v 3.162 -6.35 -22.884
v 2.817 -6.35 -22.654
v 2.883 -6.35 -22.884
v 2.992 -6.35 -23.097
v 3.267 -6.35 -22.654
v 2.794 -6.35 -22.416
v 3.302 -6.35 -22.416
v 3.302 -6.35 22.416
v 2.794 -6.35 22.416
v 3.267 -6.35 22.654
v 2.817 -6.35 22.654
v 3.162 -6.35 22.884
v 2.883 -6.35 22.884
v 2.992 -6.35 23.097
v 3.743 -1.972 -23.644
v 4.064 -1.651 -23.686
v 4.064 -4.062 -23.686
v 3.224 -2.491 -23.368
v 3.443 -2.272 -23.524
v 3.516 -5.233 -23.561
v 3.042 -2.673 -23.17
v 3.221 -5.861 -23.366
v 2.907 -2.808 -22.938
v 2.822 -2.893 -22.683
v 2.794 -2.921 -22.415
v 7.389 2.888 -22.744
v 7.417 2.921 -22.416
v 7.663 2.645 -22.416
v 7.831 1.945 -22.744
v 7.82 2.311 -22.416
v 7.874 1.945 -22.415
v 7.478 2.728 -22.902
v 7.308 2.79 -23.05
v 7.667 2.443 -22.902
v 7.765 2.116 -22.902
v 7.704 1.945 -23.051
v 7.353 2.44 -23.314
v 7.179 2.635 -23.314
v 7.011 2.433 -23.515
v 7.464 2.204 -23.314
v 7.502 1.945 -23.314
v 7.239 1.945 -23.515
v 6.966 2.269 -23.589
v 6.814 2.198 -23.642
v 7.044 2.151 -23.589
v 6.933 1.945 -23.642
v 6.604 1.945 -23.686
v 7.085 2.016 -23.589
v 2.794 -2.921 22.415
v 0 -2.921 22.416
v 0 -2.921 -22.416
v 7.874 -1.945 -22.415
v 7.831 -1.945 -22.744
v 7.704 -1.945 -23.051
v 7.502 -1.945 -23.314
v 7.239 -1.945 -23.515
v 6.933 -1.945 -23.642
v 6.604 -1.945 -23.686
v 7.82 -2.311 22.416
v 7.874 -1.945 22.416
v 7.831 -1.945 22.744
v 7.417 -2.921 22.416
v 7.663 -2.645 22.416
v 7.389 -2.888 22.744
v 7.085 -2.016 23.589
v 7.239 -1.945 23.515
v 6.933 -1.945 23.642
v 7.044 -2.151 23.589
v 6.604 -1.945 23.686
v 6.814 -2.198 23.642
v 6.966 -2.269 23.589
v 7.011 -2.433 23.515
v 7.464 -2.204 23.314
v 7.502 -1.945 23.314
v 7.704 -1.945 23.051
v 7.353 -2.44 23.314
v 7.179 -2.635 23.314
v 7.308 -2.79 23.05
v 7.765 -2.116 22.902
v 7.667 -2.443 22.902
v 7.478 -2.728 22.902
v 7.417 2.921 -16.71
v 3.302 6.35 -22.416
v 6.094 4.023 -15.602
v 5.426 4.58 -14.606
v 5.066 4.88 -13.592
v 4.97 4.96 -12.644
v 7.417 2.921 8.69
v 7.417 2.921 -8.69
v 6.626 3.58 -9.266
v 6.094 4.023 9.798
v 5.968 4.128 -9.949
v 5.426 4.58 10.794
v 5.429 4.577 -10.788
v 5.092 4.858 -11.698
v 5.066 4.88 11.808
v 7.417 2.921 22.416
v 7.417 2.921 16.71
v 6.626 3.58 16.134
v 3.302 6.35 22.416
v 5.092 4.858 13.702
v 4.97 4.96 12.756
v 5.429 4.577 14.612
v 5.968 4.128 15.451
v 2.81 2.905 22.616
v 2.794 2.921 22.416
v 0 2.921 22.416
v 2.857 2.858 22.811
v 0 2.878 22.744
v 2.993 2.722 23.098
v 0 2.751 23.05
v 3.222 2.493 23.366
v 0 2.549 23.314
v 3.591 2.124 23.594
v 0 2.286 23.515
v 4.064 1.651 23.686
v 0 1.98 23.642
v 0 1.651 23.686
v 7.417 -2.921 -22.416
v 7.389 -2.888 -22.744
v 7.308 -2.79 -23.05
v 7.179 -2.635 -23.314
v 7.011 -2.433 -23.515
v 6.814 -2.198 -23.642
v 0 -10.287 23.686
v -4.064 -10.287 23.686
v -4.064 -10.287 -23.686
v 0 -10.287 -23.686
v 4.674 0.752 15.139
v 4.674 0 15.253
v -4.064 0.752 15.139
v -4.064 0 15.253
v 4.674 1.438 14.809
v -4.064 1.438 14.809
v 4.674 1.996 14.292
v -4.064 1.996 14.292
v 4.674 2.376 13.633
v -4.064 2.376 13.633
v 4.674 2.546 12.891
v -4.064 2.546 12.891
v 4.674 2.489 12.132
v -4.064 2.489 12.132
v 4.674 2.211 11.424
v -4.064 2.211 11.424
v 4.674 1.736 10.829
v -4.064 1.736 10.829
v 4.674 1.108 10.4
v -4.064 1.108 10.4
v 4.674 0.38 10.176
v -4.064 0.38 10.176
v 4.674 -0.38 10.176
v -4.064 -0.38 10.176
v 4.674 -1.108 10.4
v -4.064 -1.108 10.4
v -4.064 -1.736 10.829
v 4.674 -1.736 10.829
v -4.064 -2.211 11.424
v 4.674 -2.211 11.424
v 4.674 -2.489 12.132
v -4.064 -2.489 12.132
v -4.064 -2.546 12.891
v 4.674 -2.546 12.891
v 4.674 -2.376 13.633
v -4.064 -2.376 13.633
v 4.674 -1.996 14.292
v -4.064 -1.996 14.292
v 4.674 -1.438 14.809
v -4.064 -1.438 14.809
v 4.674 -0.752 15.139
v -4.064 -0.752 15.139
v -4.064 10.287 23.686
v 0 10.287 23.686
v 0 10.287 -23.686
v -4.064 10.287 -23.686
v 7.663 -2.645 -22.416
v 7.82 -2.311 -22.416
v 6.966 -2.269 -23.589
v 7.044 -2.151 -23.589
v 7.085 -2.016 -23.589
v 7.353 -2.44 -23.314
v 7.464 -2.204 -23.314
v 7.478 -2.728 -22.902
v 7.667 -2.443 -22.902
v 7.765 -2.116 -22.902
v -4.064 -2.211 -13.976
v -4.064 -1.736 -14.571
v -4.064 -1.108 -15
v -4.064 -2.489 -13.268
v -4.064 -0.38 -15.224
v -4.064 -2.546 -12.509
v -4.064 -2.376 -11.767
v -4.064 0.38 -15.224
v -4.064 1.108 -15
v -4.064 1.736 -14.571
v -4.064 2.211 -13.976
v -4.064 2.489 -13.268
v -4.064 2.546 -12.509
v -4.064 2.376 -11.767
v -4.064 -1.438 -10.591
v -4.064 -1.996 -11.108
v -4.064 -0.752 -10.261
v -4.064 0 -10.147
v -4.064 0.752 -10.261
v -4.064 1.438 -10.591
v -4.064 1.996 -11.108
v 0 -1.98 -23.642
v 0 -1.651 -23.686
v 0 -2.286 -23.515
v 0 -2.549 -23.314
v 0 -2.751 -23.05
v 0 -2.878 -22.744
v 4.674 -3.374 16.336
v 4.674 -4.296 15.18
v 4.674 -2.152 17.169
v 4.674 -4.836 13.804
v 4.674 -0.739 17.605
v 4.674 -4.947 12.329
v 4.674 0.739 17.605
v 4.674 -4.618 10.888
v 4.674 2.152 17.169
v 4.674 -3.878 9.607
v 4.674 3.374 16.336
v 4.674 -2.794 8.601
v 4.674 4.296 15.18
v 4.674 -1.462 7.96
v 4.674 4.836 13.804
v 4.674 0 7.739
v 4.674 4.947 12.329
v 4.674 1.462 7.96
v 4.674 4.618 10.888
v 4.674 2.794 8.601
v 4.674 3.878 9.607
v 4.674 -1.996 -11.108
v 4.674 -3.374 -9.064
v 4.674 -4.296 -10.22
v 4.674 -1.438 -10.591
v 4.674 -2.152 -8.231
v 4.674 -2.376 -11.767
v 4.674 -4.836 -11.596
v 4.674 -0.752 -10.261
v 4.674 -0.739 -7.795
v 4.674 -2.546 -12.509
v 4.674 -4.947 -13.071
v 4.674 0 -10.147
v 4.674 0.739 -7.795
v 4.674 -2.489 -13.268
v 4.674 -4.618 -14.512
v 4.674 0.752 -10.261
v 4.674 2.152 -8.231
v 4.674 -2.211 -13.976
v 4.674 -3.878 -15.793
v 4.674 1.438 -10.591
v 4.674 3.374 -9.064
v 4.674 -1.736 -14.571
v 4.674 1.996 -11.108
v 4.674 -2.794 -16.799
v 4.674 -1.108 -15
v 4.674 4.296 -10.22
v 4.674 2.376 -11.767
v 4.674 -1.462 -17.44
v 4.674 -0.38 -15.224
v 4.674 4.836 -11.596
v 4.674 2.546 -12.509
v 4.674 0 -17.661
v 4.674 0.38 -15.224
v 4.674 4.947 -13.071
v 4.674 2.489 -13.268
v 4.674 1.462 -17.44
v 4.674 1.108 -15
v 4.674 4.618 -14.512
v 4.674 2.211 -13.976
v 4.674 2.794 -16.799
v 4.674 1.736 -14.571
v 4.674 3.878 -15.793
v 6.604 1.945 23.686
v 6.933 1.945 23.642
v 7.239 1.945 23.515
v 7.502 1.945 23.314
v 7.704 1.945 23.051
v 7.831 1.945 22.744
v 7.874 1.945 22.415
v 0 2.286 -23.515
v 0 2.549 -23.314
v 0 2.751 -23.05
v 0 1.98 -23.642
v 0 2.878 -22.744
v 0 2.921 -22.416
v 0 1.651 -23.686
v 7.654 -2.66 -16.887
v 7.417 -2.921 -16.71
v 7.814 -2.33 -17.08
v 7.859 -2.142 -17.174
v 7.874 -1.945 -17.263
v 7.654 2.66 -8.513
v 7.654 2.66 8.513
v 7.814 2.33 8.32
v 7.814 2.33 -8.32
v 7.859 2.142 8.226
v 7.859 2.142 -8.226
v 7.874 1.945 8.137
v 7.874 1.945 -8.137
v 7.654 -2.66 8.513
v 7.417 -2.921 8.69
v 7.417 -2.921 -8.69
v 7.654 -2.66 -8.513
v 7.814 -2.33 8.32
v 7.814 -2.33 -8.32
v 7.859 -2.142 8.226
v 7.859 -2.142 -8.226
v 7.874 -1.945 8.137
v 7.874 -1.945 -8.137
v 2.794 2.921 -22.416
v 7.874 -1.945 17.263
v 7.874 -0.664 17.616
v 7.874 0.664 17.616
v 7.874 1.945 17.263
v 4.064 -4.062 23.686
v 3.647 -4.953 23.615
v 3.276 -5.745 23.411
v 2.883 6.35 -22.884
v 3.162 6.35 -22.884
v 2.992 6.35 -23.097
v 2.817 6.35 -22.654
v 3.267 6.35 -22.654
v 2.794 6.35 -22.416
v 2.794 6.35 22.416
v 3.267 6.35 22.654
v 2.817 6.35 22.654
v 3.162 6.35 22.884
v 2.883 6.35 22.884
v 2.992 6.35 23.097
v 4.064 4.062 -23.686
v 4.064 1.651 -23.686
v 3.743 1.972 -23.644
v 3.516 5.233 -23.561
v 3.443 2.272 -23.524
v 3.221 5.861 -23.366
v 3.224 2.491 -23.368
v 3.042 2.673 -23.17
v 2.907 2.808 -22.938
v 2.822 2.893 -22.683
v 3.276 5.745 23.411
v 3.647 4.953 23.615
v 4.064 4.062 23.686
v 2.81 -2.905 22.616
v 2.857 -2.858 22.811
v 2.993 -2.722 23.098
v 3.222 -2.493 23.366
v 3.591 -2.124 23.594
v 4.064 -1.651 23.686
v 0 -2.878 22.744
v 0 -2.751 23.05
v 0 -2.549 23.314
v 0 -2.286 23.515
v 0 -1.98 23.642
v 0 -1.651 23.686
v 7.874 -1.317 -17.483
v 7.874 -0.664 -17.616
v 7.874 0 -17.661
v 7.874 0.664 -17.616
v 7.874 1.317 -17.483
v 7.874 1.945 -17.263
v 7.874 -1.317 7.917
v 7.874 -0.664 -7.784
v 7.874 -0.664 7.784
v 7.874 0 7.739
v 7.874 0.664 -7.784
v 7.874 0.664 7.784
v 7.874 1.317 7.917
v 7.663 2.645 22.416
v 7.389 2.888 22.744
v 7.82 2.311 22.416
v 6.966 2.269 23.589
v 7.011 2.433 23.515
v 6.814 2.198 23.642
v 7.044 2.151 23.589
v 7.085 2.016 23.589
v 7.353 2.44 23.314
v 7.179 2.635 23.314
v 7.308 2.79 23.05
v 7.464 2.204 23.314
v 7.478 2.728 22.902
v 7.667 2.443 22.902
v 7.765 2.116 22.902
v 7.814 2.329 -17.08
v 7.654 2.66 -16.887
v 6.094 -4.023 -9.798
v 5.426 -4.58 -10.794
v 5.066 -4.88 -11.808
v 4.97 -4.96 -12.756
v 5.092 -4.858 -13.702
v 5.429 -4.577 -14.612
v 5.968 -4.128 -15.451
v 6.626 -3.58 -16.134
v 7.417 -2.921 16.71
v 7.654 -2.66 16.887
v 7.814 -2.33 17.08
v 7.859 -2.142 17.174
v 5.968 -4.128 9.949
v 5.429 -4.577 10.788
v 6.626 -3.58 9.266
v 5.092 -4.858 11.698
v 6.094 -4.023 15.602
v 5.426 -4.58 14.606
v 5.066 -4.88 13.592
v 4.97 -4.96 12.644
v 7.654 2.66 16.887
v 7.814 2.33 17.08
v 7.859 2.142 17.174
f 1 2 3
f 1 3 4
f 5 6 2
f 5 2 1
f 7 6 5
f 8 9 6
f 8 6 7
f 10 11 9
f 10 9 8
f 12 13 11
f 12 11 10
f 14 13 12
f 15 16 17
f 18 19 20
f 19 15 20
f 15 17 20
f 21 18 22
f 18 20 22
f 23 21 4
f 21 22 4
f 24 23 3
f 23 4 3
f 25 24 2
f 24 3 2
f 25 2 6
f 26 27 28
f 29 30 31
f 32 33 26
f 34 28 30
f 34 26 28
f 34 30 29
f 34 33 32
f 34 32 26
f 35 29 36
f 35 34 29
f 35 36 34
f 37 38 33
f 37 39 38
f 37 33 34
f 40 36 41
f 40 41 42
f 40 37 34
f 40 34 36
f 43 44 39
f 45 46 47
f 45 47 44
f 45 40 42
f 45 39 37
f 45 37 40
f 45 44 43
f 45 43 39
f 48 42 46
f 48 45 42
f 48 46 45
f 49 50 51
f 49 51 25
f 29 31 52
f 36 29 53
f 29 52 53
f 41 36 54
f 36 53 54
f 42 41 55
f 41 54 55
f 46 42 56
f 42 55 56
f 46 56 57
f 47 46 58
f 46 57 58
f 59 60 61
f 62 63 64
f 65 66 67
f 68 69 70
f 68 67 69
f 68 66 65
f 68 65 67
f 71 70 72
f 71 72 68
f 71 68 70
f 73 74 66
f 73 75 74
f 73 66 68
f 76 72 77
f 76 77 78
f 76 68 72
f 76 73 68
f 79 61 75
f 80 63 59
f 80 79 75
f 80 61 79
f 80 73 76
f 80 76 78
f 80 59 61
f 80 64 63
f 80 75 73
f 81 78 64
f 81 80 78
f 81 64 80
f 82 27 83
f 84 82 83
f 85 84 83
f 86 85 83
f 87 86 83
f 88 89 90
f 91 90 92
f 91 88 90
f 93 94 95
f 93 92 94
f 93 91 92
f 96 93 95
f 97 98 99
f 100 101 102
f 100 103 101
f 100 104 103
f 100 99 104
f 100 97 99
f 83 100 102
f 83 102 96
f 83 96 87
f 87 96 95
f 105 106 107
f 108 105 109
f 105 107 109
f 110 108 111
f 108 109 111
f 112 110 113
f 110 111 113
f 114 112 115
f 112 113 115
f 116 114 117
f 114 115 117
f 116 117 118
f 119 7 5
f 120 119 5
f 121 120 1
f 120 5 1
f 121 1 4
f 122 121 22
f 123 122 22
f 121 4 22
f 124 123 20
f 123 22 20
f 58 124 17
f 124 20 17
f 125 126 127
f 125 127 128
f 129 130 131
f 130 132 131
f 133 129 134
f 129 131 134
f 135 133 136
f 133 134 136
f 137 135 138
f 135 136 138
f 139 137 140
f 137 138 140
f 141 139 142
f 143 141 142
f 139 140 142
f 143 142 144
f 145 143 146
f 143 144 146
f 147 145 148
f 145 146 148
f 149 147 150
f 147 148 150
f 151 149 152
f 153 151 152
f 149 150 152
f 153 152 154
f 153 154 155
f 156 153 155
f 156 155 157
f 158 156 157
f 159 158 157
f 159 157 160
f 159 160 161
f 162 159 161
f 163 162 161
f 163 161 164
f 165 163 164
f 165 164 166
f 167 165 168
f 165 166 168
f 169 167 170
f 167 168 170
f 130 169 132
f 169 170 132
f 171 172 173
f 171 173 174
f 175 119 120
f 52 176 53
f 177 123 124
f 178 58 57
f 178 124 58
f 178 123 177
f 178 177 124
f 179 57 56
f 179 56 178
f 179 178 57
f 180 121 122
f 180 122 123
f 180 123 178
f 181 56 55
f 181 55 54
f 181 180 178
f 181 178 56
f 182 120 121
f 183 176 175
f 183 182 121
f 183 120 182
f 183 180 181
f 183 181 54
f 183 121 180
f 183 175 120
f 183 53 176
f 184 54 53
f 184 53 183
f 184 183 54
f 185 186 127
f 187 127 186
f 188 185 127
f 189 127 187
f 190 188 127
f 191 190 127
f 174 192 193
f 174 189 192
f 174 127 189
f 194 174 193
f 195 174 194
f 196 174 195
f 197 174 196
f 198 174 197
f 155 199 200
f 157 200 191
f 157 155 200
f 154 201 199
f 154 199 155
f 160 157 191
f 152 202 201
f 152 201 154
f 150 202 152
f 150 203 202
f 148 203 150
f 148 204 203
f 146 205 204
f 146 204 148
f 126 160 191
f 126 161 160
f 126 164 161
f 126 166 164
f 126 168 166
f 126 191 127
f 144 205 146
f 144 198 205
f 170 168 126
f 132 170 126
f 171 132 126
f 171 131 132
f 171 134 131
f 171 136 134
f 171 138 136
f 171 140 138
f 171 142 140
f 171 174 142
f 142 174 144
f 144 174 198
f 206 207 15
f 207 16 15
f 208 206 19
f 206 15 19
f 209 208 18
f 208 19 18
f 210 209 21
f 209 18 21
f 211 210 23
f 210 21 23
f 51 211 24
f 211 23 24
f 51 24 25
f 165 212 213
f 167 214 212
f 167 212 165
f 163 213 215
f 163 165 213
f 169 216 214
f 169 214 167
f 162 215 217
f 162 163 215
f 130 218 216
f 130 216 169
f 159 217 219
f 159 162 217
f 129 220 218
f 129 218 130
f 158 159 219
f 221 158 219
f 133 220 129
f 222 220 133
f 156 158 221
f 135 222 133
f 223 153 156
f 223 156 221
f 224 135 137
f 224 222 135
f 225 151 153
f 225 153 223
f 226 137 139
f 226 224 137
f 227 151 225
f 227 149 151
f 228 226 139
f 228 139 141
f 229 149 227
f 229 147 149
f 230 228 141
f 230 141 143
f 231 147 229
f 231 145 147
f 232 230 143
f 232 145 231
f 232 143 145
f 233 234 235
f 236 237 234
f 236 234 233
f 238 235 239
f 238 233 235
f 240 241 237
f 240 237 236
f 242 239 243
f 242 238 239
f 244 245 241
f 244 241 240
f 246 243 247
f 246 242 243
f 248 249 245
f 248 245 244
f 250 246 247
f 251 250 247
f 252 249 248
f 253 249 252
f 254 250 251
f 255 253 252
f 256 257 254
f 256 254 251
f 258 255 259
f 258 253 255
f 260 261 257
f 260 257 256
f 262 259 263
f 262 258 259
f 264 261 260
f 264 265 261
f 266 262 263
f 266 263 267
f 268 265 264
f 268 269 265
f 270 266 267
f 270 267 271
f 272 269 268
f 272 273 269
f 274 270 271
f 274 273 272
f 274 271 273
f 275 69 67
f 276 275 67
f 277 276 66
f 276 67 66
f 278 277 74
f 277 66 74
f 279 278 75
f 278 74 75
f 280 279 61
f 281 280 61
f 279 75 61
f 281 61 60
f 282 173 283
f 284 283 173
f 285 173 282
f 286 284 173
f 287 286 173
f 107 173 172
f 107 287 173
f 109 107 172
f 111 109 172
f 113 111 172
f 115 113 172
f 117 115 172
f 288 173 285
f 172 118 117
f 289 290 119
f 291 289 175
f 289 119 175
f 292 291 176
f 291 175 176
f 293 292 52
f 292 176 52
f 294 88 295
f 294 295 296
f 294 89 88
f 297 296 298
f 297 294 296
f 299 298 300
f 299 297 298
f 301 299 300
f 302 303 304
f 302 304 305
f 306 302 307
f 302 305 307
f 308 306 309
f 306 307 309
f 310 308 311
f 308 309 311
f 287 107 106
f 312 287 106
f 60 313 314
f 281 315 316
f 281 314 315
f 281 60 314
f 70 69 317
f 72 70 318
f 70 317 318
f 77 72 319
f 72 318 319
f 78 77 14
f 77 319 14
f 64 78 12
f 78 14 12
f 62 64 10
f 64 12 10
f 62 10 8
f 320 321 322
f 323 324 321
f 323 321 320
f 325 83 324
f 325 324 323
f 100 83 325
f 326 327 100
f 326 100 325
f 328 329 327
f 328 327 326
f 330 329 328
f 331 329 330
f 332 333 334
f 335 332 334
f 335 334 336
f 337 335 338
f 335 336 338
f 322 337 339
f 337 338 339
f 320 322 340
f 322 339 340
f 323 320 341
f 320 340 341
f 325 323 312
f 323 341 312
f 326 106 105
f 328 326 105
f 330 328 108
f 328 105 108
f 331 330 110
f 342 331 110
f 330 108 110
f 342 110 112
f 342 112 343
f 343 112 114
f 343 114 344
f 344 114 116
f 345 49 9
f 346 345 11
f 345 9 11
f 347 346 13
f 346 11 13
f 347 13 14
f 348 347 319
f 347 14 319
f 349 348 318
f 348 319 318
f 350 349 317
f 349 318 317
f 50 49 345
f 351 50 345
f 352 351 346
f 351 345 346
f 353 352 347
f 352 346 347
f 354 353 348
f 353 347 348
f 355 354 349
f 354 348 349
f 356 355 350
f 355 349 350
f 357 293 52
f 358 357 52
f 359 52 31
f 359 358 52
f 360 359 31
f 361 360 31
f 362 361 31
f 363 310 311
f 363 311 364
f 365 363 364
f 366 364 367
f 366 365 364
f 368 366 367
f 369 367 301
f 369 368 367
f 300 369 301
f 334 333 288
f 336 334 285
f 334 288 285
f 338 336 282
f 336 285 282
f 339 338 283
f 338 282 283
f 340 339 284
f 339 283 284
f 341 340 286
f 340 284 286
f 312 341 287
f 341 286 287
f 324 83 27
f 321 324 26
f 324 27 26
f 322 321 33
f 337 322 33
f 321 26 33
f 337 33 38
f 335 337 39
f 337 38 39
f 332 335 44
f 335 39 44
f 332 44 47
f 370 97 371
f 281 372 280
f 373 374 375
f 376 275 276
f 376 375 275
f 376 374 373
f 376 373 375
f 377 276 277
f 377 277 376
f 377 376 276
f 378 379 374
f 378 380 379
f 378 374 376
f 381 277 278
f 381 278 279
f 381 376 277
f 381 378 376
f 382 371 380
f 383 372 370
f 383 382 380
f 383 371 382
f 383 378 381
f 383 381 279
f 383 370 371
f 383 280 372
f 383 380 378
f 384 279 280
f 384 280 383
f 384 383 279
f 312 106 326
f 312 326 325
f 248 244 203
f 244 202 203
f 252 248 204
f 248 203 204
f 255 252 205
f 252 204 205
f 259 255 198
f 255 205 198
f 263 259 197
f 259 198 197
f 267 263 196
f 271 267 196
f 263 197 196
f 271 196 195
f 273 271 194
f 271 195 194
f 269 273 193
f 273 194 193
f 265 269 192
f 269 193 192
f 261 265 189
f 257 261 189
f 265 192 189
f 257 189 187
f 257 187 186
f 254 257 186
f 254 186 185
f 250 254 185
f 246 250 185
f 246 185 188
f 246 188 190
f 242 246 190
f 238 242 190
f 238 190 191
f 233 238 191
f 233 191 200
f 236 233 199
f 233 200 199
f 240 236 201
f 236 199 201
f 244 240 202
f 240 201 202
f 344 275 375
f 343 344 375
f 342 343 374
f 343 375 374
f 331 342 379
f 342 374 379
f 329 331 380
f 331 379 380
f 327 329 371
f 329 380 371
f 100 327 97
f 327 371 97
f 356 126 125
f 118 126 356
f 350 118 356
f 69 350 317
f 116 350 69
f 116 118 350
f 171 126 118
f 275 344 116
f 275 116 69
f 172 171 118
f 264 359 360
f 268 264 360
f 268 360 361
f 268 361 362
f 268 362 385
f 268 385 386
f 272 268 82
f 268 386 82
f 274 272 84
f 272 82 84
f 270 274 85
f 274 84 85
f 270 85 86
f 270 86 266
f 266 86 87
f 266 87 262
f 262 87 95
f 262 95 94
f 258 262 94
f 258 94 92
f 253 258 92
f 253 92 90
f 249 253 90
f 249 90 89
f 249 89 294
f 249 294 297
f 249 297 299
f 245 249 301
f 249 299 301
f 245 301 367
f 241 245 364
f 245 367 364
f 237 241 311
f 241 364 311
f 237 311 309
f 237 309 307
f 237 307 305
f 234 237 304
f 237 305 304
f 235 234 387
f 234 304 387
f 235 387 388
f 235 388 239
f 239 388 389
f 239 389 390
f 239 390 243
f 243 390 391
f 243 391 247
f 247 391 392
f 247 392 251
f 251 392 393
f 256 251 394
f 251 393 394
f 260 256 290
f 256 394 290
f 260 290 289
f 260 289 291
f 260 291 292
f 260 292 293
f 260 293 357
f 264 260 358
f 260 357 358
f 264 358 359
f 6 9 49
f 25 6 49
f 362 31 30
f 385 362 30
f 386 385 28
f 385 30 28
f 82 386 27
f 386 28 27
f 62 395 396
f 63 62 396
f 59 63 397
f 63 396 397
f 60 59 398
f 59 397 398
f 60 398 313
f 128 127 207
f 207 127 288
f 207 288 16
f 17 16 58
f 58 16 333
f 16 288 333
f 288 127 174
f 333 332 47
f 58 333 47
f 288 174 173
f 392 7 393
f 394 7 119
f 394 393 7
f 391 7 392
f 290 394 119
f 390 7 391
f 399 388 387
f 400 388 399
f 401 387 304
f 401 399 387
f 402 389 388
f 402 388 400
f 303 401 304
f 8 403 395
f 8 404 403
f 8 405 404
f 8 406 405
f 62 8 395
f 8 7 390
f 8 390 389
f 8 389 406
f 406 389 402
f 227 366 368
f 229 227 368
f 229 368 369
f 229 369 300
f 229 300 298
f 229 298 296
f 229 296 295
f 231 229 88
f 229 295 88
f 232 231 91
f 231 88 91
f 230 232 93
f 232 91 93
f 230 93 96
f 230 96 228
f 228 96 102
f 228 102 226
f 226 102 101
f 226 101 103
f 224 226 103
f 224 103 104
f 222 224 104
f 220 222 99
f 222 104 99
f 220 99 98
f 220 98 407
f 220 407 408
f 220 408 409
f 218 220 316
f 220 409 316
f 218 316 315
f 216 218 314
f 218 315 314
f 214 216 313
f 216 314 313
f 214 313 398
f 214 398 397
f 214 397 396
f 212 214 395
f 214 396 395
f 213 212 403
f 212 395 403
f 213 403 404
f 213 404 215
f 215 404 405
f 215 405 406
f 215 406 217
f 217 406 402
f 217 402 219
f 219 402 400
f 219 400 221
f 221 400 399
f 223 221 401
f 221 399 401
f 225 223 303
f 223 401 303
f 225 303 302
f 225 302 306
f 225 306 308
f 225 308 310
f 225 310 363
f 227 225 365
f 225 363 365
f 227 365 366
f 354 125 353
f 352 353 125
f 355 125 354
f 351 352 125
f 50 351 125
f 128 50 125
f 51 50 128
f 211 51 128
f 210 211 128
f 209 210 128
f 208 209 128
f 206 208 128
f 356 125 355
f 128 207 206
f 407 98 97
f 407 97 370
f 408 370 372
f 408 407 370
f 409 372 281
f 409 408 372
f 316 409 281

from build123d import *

# Parameters (mm, degrees)
BOSS_EXTRUDE1_DEPTH                             = 47.371
SKETCH2_W                                       = 6.858
SKETCH2_H                                       = 3.429
CUT_EXTRUDE1_DEPTH                              = 49.438972089
SKETCH3_W                                       = 4.064
SKETCH3_H                                       = 47.371
BOSS_EXTRUDE2_DEPTH                             = 7.366
SKETCH4_W                                       = 6.858
SKETCH4_H                                       = 3.429
CUT_EXTRUDE2_DEPTH                              = 50.110425431
SKETCH5_W                                       = 4.064
SKETCH5_H                                       = 47.371
BOSS_EXTRUDE3_DEPTH                             = 7.366
F_3_CLEARANCE_HOLE1_D                           = 2.7686
CBORE_FOR_10_BUTTON_HEAD_CAP_SCREW1_D           = 5.1054
CBORE_FOR_10_BUTTON_HEAD_CAP_SCREW1_CBORE_D     = 9.92124
CBORE_FOR_10_BUTTON_HEAD_CAP_SCREW1_CBORE_DEPTH = 3.2004
FILLET1_R                                       = 1.27
FILLET3_R                                       = 1.27
FILLET5_R                                       = 1.27


with BuildPart() as part:
    # Sketch1 → Boss-Extrude1 (new body)
    with BuildSketch(Plane.XY.offset(23.6855)):
        Polygon((3.302, 6.35), (-4.064, 6.35), (-4.064, -6.35), (3.302, -6.35), (7.874, -2.54), (7.874, 2.54), align=None)
    extrude(amount=-BOSS_EXTRUDE1_DEPTH)

    # Sketch2 → Cut-Extrude1 (cut, through all)
    with BuildSketch(Plane.XY.offset(23.6855)):
        with Locations((-0.635, 4.6355)):
            Rectangle(SKETCH2_W, SKETCH2_H)
    extrude(amount=-CUT_EXTRUDE1_DEPTH, mode=Mode.SUBTRACT)

    # Sketch3 → Boss-Extrude2 (add)
    with BuildSketch(Plane(origin=(0, 2.921, 0), x_dir=(-1, 0, 0), z_dir=(0, 1, 0))):
        with Locations((2.032, 0)):
            Rectangle(SKETCH3_W, SKETCH3_H)
    extrude(amount=BOSS_EXTRUDE2_DEPTH)

    # Sketch4 → Cut-Extrude2 (cut, through all)
    with BuildSketch(Plane.XY.offset(23.6855)):
        with Locations((-0.635, -4.6355)):
            Rectangle(SKETCH4_W, SKETCH4_H)
    extrude(amount=-CUT_EXTRUDE2_DEPTH, mode=Mode.SUBTRACT)

    # Sketch5 → Boss-Extrude3 (add)
    with BuildSketch(Plane.XZ.offset(2.921)):
        with Locations((-2.032, 0)):
            Rectangle(SKETCH5_W, SKETCH5_H)
    extrude(amount=BOSS_EXTRUDE3_DEPTH)

    # #3 Clearance Hole1 (through all)
    with Locations(Plane.ZY.offset(4.064)):
        with Locations((12.7, 0), (-12.7, 0)):
            Hole(F_3_CLEARANCE_HOLE1_D / 2)

    # CBORE for #10 Button Head Cap Screw1 (through all)
    with Locations(Plane(origin=(7.874, 0, 0), x_dir=(0, 0, -1), z_dir=(1, 0, 0))):
        with Locations((-12.7, 0), (12.7, 0)):
            CounterBoreHole(CBORE_FOR_10_BUTTON_HEAD_CAP_SCREW1_D / 2, CBORE_FOR_10_BUTTON_HEAD_CAP_SCREW1_CBORE_D / 2, CBORE_FOR_10_BUTTON_HEAD_CAP_SCREW1_CBORE_DEPTH)

    # Fillet1
    fillet1_edges = [part.edges().sort_by_distance(p)[0] for p in [
        (7.874, -2.54, 20.323251747),
        (7.874, -2.54, -20.323251747),
        (7.874, -2.54, 0),
        (7.874, 2.54, 20.323251747),
        (7.874, 2.54, 0),
        (7.874, 2.54, -20.323251747),
    ]]
    fillet(fillet1_edges, radius=FILLET1_R)

    # Fillet3
    # the kernel refuses this fillet: 1.27 mm, written as the material it takes off along each edge
    with BuildSketch(Plane(origin=(0.862897437, -8.382585469, -23.6855), x_dir=(0, 0, 1), z_dir=(0.7682212795973759, 0.6401843996644799, 0)), Plane(origin=(7.417034188, 2.920804844, -23.6855), x_dir=(0, 0, 1), z_dir=(-0.7682212795973759, 0.6401843996644799, 0))) as fillet3_piece_1:
        with BuildLine():
            CenterArc((FILLET3_R, -FILLET3_R), FILLET3_R, 90, 90)
            Line((0, -FILLET3_R), (0, 0))
            Line((0, 0), (FILLET3_R, 0))
        make_face()
    extrude(amount=8.531574072, mode=Mode.SUBTRACT)
    with BuildSketch(Plane(origin=(6.604, -1.945163819, -23.6855), x_dir=(0.6401843996644796, -0.7682212795973762, 0), z_dir=(-0.7682212795973762, -0.6401843996644796, 0))) as fillet3_piece_2:
        with BuildLine():
            CenterArc((1.27 - FILLET3_R, FILLET3_R), FILLET3_R, 270, 90)
            Line((1.27, FILLET3_R), (1.27, 0))
            Line((1.27, 0), (1.27 - FILLET3_R, 0))
        make_face()
    revolve(axis=Axis((6.604, -1.945163819, -23.6855), (0, 0, 1)), revolution_arc=50.194428908, mode=Mode.SUBTRACT)
    with BuildSketch(Plane(origin=(6.604, 1.945163819, -23.6855), x_dir=(0.6401843996644799, 0.7682212795973757, 0), z_dir=(-0.7682212795973757, 0.6401843996644799, 0))) as fillet3_piece_3:
        with BuildLine():
            CenterArc((1.27 - FILLET3_R, -FILLET3_R), FILLET3_R, 0, 90)
            Line((1.27, -FILLET3_R), (1.27, 0))
            Line((1.27, 0), (1.27 - FILLET3_R, 0))
        make_face()
    revolve(axis=Axis((6.604, 1.945163819, -23.6855), (0, 0, -1)), revolution_arc=50.194428908, mode=Mode.SUBTRACT)
    with BuildSketch(Plane(origin=(2.794, -2.921, -23.6855), x_dir=(0, 0, 1), z_dir=(-1, 0, 0)), Plane(origin=(0, 2.921, -23.6855), x_dir=(0, 0, 1), z_dir=(1, 0, 0))) as fillet3_piece_4:
        with BuildLine():
            CenterArc((FILLET3_R, FILLET3_R), FILLET3_R, 180, 90)
            Line((0, FILLET3_R), (0, 0))
            Line((0, 0), (FILLET3_R, 0))
        make_face()
    extrude(amount=2.794, mode=Mode.SUBTRACT)
    with BuildSketch(Plane(origin=(2.794, 2.921, -23.6855), x_dir=(0, 0, 1), z_dir=(0, 1, 0)), Plane(origin=(2.794, -9.525, -23.6855), x_dir=(0, 0, 1), z_dir=(0, 1, 0))) as fillet3_piece_5:
        with BuildLine():
            CenterArc((FILLET3_R, FILLET3_R), FILLET3_R, 180, 90)
            Line((0, FILLET3_R), (0, 0))
            Line((0, 0), (FILLET3_R, 0))
        make_face()
    extrude(amount=6.604, mode=Mode.SUBTRACT)
    with BuildSketch(Plane(origin=(7.874, -1.945163819, -23.6855), x_dir=(-1, 0, 0), z_dir=(0, 1, 0))) as fillet3_piece_6:
        with BuildLine():
            CenterArc((FILLET3_R, FILLET3_R), FILLET3_R, 180, 90)
            Line((0, FILLET3_R), (0, 0))
            Line((0, 0), (FILLET3_R, 0))
        make_face()
    extrude(amount=3.890327637, mode=Mode.SUBTRACT)
    with BuildSketch(Plane(origin=(2.794, -9.525, -23.6855), x_dir=(0, 0, 1), z_dir=(0, 1, 0))) as fillet3_piece_7a_section:
        with BuildLine():
            CenterArc((FILLET3_R, FILLET3_R), FILLET3_R, 180, 90)
            Line((0, FILLET3_R), (0, 0))
            Line((0, 0), (FILLET3_R, 0))
        make_face()
    fillet3_piece_7a = extrude(amount=9.779, mode=Mode.PRIVATE)
    fillet3_piece_7a = split(fillet3_piece_7a, bisect_by=Plane(origin=(3.081521795, -2.921, -23.397978205), z_dir=(0, 1, 0)), keep=Keep.TOP, mode=Mode.PRIVATE)
    with BuildSketch(Plane(origin=(5.969, -2.921, -23.6855), x_dir=(0, 0, 1), z_dir=(-1, 0, 0))) as fillet3_piece_7b_section:
        with BuildLine():
            CenterArc((FILLET3_R, FILLET3_R), FILLET3_R, 180, 90)
            Line((0, FILLET3_R), (0, 0))
            Line((0, 0), (FILLET3_R, 0))
        make_face()
    fillet3_piece_7b = extrude(amount=5.969, mode=Mode.PRIVATE)
    fillet3_piece_7b = split(fillet3_piece_7b, bisect_by=Plane(origin=(2.794, -2.633478205, -23.397978205), z_dir=(1, 0, 0)), keep=Keep.TOP, mode=Mode.PRIVATE)
    fillet3_piece_7 = fillet3_piece_7a & fillet3_piece_7b
    add(fillet3_piece_7, mode=Mode.SUBTRACT)
    with BuildSketch(Plane(origin=(2.794, -0.254, -23.6855), x_dir=(0, 0, 1), z_dir=(0, 1, 0))) as fillet3_piece_8a_section:
        with BuildLine():
            CenterArc((FILLET3_R, FILLET3_R), FILLET3_R, 180, 90)
            Line((0, FILLET3_R), (0, 0))
            Line((0, 0), (FILLET3_R, 0))
        make_face()
    fillet3_piece_8a = extrude(amount=9.779, mode=Mode.PRIVATE)
    fillet3_piece_8a = split(fillet3_piece_8a, bisect_by=Plane(origin=(3.081521795, 2.921, -23.397978205), z_dir=(0, -1, 0)), keep=Keep.TOP, mode=Mode.PRIVATE)
    with BuildSketch(Plane(origin=(0, 2.921, -23.6855), x_dir=(0, 0, 1), z_dir=(1, 0, 0))) as fillet3_piece_8b_section:
        with BuildLine():
            CenterArc((FILLET3_R, FILLET3_R), FILLET3_R, 180, 90)
            Line((0, FILLET3_R), (0, 0))
            Line((0, 0), (FILLET3_R, 0))
        make_face()
    fillet3_piece_8b = extrude(amount=5.969, mode=Mode.PRIVATE)
    fillet3_piece_8b = split(fillet3_piece_8b, bisect_by=Plane(origin=(2.794, 2.633478205, -23.397978205), z_dir=(1, 0, 0)), keep=Keep.TOP, mode=Mode.PRIVATE)
    fillet3_piece_8 = fillet3_piece_8a & fillet3_piece_8b
    add(fillet3_piece_8, mode=Mode.SUBTRACT)

    # Fillet5
    # the kernel refuses this fillet: 1.27 mm, written as the material it takes off along each edge
    with BuildSketch(Plane(origin=(0.862897437, -8.382585469, 23.6855), x_dir=(-0.6401843996644799, 0.7682212795973759, 0), z_dir=(0.7682212795973759, 0.6401843996644799, 0)), Plane(origin=(7.417034188, 2.920804844, 23.6855), x_dir=(-0.6401843996644799, -0.7682212795973759, 0), z_dir=(-0.7682212795973759, 0.6401843996644799, 0))) as fillet5_piece_1:
        with BuildLine():
            CenterArc((FILLET5_R, -FILLET5_R), FILLET5_R, 90, 90)
            Line((0, -FILLET5_R), (0, 0))
            Line((0, 0), (FILLET5_R, 0))
        make_face()
    extrude(amount=8.531574072, mode=Mode.SUBTRACT)
    with BuildSketch(Plane(origin=(6.604, -1.945163819, 23.6855), x_dir=(1, 0, 0), z_dir=(0, 1, 0))) as fillet5_piece_2:
        with BuildLine():
            CenterArc((1.27 - FILLET5_R, FILLET5_R), FILLET5_R, 270, 90)
            Line((1.27, FILLET5_R), (1.27, 0))
            Line((1.27, 0), (1.27 - FILLET5_R, 0))
        make_face()
    revolve(axis=Axis((6.604, -1.945163819, 23.6855), (0, 0, -1)), revolution_arc=50.194428908, mode=Mode.SUBTRACT)
    with BuildSketch(Plane(origin=(6.604, 1.945163819, 23.6855), x_dir=(0.6401843996644799, 0.7682212795973757, 0), z_dir=(-0.7682212795973757, 0.6401843996644799, 0))) as fillet5_piece_3:
        with BuildLine():
            CenterArc((1.27 - FILLET5_R, FILLET5_R), FILLET5_R, 270, 90)
            Line((1.27, FILLET5_R), (1.27, 0))
            Line((1.27, 0), (1.27 - FILLET5_R, 0))
        make_face()
    revolve(axis=Axis((6.604, 1.945163819, 23.6855), (0, 0, -1)), revolution_arc=50.194428908, mode=Mode.SUBTRACT)
    with BuildSketch(Plane(origin=(2.794, 2.921, 23.6855), x_dir=(1, 0, 0), z_dir=(0, 1, 0)), Plane(origin=(2.794, -9.525, 23.6855), x_dir=(1, 0, 0), z_dir=(0, 1, 0))) as fillet5_piece_4:
        with BuildLine():
            CenterArc((FILLET5_R, FILLET5_R), FILLET5_R, 180, 90)
            Line((0, FILLET5_R), (0, 0))
            Line((0, 0), (FILLET5_R, 0))
        make_face()
    extrude(amount=6.604, mode=Mode.SUBTRACT)
    with BuildSketch(Plane(origin=(0, 2.921, 23.6855), x_dir=(0, -1, 0), z_dir=(1, 0, 0)), Plane(origin=(2.794, -2.921, 23.6855), x_dir=(0, 1, 0), z_dir=(-1, 0, 0))) as fillet5_piece_5:
        with BuildLine():
            CenterArc((FILLET5_R, FILLET5_R), FILLET5_R, 180, 90)
            Line((0, FILLET5_R), (0, 0))
            Line((0, 0), (FILLET5_R, 0))
        make_face()
    extrude(amount=2.794, mode=Mode.SUBTRACT)
    with BuildSketch(Plane(origin=(7.874, -1.945163819, 23.6855), x_dir=(-1, 0, 0), z_dir=(0, 1, 0))) as fillet5_piece_6:
        with BuildLine():
            CenterArc((FILLET5_R, -FILLET5_R), FILLET5_R, 90, 90)
            Line((0, -FILLET5_R), (0, 0))
            Line((0, 0), (FILLET5_R, 0))
        make_face()
    extrude(amount=3.890327637, mode=Mode.SUBTRACT)
    with BuildSketch(Plane(origin=(2.794, -0.254, 23.6855), x_dir=(1, 0, 0), z_dir=(0, 1, 0))) as fillet5_piece_7a_section:
        with BuildLine():
            CenterArc((FILLET5_R, FILLET5_R), FILLET5_R, 180, 90)
            Line((0, FILLET5_R), (0, 0))
            Line((0, 0), (FILLET5_R, 0))
        make_face()
    fillet5_piece_7a = extrude(amount=9.779, mode=Mode.PRIVATE)
    fillet5_piece_7a = split(fillet5_piece_7a, bisect_by=Plane(origin=(3.081521795, 2.921, 23.397978205), z_dir=(0, -1, 0)), keep=Keep.TOP, mode=Mode.PRIVATE)
    with BuildSketch(Plane(origin=(0, 2.921, 23.6855), x_dir=(0, -1, 0), z_dir=(1, 0, 0))) as fillet5_piece_7b_section:
        with BuildLine():
            CenterArc((FILLET5_R, FILLET5_R), FILLET5_R, 180, 90)
            Line((0, FILLET5_R), (0, 0))
            Line((0, 0), (FILLET5_R, 0))
        make_face()
    fillet5_piece_7b = extrude(amount=5.969, mode=Mode.PRIVATE)
    fillet5_piece_7b = split(fillet5_piece_7b, bisect_by=Plane(origin=(2.794, 2.633478205, 23.397978205), z_dir=(1, 0, 0)), keep=Keep.TOP, mode=Mode.PRIVATE)
    fillet5_piece_7 = fillet5_piece_7a & fillet5_piece_7b
    add(fillet5_piece_7, mode=Mode.SUBTRACT)
    with BuildSketch(Plane(origin=(2.794, -9.525, 23.6855), x_dir=(1, 0, 0), z_dir=(0, 1, 0))) as fillet5_piece_8a_section:
        with BuildLine():
            CenterArc((FILLET5_R, FILLET5_R), FILLET5_R, 180, 90)
            Line((0, FILLET5_R), (0, 0))
            Line((0, 0), (FILLET5_R, 0))
        make_face()
    fillet5_piece_8a = extrude(amount=9.779, mode=Mode.PRIVATE)
    fillet5_piece_8a = split(fillet5_piece_8a, bisect_by=Plane(origin=(3.081521795, -2.921, 23.397978205), z_dir=(0, 1, 0)), keep=Keep.TOP, mode=Mode.PRIVATE)
    with BuildSketch(Plane(origin=(5.969, -2.921, 23.6855), x_dir=(0, 1, 0), z_dir=(-1, 0, 0))) as fillet5_piece_8b_section:
        with BuildLine():
            CenterArc((FILLET5_R, FILLET5_R), FILLET5_R, 180, 90)
            Line((0, FILLET5_R), (0, 0))
            Line((0, 0), (FILLET5_R, 0))
        make_face()
    fillet5_piece_8b = extrude(amount=5.969, mode=Mode.PRIVATE)
    fillet5_piece_8b = split(fillet5_piece_8b, bisect_by=Plane(origin=(2.794, -2.633478205, 23.397978205), z_dir=(1, 0, 0)), keep=Keep.TOP, mode=Mode.PRIVATE)
    fillet5_piece_8 = fillet5_piece_8a & fillet5_piece_8b
    add(fillet5_piece_8, mode=Mode.SUBTRACT)


solid = part.part
